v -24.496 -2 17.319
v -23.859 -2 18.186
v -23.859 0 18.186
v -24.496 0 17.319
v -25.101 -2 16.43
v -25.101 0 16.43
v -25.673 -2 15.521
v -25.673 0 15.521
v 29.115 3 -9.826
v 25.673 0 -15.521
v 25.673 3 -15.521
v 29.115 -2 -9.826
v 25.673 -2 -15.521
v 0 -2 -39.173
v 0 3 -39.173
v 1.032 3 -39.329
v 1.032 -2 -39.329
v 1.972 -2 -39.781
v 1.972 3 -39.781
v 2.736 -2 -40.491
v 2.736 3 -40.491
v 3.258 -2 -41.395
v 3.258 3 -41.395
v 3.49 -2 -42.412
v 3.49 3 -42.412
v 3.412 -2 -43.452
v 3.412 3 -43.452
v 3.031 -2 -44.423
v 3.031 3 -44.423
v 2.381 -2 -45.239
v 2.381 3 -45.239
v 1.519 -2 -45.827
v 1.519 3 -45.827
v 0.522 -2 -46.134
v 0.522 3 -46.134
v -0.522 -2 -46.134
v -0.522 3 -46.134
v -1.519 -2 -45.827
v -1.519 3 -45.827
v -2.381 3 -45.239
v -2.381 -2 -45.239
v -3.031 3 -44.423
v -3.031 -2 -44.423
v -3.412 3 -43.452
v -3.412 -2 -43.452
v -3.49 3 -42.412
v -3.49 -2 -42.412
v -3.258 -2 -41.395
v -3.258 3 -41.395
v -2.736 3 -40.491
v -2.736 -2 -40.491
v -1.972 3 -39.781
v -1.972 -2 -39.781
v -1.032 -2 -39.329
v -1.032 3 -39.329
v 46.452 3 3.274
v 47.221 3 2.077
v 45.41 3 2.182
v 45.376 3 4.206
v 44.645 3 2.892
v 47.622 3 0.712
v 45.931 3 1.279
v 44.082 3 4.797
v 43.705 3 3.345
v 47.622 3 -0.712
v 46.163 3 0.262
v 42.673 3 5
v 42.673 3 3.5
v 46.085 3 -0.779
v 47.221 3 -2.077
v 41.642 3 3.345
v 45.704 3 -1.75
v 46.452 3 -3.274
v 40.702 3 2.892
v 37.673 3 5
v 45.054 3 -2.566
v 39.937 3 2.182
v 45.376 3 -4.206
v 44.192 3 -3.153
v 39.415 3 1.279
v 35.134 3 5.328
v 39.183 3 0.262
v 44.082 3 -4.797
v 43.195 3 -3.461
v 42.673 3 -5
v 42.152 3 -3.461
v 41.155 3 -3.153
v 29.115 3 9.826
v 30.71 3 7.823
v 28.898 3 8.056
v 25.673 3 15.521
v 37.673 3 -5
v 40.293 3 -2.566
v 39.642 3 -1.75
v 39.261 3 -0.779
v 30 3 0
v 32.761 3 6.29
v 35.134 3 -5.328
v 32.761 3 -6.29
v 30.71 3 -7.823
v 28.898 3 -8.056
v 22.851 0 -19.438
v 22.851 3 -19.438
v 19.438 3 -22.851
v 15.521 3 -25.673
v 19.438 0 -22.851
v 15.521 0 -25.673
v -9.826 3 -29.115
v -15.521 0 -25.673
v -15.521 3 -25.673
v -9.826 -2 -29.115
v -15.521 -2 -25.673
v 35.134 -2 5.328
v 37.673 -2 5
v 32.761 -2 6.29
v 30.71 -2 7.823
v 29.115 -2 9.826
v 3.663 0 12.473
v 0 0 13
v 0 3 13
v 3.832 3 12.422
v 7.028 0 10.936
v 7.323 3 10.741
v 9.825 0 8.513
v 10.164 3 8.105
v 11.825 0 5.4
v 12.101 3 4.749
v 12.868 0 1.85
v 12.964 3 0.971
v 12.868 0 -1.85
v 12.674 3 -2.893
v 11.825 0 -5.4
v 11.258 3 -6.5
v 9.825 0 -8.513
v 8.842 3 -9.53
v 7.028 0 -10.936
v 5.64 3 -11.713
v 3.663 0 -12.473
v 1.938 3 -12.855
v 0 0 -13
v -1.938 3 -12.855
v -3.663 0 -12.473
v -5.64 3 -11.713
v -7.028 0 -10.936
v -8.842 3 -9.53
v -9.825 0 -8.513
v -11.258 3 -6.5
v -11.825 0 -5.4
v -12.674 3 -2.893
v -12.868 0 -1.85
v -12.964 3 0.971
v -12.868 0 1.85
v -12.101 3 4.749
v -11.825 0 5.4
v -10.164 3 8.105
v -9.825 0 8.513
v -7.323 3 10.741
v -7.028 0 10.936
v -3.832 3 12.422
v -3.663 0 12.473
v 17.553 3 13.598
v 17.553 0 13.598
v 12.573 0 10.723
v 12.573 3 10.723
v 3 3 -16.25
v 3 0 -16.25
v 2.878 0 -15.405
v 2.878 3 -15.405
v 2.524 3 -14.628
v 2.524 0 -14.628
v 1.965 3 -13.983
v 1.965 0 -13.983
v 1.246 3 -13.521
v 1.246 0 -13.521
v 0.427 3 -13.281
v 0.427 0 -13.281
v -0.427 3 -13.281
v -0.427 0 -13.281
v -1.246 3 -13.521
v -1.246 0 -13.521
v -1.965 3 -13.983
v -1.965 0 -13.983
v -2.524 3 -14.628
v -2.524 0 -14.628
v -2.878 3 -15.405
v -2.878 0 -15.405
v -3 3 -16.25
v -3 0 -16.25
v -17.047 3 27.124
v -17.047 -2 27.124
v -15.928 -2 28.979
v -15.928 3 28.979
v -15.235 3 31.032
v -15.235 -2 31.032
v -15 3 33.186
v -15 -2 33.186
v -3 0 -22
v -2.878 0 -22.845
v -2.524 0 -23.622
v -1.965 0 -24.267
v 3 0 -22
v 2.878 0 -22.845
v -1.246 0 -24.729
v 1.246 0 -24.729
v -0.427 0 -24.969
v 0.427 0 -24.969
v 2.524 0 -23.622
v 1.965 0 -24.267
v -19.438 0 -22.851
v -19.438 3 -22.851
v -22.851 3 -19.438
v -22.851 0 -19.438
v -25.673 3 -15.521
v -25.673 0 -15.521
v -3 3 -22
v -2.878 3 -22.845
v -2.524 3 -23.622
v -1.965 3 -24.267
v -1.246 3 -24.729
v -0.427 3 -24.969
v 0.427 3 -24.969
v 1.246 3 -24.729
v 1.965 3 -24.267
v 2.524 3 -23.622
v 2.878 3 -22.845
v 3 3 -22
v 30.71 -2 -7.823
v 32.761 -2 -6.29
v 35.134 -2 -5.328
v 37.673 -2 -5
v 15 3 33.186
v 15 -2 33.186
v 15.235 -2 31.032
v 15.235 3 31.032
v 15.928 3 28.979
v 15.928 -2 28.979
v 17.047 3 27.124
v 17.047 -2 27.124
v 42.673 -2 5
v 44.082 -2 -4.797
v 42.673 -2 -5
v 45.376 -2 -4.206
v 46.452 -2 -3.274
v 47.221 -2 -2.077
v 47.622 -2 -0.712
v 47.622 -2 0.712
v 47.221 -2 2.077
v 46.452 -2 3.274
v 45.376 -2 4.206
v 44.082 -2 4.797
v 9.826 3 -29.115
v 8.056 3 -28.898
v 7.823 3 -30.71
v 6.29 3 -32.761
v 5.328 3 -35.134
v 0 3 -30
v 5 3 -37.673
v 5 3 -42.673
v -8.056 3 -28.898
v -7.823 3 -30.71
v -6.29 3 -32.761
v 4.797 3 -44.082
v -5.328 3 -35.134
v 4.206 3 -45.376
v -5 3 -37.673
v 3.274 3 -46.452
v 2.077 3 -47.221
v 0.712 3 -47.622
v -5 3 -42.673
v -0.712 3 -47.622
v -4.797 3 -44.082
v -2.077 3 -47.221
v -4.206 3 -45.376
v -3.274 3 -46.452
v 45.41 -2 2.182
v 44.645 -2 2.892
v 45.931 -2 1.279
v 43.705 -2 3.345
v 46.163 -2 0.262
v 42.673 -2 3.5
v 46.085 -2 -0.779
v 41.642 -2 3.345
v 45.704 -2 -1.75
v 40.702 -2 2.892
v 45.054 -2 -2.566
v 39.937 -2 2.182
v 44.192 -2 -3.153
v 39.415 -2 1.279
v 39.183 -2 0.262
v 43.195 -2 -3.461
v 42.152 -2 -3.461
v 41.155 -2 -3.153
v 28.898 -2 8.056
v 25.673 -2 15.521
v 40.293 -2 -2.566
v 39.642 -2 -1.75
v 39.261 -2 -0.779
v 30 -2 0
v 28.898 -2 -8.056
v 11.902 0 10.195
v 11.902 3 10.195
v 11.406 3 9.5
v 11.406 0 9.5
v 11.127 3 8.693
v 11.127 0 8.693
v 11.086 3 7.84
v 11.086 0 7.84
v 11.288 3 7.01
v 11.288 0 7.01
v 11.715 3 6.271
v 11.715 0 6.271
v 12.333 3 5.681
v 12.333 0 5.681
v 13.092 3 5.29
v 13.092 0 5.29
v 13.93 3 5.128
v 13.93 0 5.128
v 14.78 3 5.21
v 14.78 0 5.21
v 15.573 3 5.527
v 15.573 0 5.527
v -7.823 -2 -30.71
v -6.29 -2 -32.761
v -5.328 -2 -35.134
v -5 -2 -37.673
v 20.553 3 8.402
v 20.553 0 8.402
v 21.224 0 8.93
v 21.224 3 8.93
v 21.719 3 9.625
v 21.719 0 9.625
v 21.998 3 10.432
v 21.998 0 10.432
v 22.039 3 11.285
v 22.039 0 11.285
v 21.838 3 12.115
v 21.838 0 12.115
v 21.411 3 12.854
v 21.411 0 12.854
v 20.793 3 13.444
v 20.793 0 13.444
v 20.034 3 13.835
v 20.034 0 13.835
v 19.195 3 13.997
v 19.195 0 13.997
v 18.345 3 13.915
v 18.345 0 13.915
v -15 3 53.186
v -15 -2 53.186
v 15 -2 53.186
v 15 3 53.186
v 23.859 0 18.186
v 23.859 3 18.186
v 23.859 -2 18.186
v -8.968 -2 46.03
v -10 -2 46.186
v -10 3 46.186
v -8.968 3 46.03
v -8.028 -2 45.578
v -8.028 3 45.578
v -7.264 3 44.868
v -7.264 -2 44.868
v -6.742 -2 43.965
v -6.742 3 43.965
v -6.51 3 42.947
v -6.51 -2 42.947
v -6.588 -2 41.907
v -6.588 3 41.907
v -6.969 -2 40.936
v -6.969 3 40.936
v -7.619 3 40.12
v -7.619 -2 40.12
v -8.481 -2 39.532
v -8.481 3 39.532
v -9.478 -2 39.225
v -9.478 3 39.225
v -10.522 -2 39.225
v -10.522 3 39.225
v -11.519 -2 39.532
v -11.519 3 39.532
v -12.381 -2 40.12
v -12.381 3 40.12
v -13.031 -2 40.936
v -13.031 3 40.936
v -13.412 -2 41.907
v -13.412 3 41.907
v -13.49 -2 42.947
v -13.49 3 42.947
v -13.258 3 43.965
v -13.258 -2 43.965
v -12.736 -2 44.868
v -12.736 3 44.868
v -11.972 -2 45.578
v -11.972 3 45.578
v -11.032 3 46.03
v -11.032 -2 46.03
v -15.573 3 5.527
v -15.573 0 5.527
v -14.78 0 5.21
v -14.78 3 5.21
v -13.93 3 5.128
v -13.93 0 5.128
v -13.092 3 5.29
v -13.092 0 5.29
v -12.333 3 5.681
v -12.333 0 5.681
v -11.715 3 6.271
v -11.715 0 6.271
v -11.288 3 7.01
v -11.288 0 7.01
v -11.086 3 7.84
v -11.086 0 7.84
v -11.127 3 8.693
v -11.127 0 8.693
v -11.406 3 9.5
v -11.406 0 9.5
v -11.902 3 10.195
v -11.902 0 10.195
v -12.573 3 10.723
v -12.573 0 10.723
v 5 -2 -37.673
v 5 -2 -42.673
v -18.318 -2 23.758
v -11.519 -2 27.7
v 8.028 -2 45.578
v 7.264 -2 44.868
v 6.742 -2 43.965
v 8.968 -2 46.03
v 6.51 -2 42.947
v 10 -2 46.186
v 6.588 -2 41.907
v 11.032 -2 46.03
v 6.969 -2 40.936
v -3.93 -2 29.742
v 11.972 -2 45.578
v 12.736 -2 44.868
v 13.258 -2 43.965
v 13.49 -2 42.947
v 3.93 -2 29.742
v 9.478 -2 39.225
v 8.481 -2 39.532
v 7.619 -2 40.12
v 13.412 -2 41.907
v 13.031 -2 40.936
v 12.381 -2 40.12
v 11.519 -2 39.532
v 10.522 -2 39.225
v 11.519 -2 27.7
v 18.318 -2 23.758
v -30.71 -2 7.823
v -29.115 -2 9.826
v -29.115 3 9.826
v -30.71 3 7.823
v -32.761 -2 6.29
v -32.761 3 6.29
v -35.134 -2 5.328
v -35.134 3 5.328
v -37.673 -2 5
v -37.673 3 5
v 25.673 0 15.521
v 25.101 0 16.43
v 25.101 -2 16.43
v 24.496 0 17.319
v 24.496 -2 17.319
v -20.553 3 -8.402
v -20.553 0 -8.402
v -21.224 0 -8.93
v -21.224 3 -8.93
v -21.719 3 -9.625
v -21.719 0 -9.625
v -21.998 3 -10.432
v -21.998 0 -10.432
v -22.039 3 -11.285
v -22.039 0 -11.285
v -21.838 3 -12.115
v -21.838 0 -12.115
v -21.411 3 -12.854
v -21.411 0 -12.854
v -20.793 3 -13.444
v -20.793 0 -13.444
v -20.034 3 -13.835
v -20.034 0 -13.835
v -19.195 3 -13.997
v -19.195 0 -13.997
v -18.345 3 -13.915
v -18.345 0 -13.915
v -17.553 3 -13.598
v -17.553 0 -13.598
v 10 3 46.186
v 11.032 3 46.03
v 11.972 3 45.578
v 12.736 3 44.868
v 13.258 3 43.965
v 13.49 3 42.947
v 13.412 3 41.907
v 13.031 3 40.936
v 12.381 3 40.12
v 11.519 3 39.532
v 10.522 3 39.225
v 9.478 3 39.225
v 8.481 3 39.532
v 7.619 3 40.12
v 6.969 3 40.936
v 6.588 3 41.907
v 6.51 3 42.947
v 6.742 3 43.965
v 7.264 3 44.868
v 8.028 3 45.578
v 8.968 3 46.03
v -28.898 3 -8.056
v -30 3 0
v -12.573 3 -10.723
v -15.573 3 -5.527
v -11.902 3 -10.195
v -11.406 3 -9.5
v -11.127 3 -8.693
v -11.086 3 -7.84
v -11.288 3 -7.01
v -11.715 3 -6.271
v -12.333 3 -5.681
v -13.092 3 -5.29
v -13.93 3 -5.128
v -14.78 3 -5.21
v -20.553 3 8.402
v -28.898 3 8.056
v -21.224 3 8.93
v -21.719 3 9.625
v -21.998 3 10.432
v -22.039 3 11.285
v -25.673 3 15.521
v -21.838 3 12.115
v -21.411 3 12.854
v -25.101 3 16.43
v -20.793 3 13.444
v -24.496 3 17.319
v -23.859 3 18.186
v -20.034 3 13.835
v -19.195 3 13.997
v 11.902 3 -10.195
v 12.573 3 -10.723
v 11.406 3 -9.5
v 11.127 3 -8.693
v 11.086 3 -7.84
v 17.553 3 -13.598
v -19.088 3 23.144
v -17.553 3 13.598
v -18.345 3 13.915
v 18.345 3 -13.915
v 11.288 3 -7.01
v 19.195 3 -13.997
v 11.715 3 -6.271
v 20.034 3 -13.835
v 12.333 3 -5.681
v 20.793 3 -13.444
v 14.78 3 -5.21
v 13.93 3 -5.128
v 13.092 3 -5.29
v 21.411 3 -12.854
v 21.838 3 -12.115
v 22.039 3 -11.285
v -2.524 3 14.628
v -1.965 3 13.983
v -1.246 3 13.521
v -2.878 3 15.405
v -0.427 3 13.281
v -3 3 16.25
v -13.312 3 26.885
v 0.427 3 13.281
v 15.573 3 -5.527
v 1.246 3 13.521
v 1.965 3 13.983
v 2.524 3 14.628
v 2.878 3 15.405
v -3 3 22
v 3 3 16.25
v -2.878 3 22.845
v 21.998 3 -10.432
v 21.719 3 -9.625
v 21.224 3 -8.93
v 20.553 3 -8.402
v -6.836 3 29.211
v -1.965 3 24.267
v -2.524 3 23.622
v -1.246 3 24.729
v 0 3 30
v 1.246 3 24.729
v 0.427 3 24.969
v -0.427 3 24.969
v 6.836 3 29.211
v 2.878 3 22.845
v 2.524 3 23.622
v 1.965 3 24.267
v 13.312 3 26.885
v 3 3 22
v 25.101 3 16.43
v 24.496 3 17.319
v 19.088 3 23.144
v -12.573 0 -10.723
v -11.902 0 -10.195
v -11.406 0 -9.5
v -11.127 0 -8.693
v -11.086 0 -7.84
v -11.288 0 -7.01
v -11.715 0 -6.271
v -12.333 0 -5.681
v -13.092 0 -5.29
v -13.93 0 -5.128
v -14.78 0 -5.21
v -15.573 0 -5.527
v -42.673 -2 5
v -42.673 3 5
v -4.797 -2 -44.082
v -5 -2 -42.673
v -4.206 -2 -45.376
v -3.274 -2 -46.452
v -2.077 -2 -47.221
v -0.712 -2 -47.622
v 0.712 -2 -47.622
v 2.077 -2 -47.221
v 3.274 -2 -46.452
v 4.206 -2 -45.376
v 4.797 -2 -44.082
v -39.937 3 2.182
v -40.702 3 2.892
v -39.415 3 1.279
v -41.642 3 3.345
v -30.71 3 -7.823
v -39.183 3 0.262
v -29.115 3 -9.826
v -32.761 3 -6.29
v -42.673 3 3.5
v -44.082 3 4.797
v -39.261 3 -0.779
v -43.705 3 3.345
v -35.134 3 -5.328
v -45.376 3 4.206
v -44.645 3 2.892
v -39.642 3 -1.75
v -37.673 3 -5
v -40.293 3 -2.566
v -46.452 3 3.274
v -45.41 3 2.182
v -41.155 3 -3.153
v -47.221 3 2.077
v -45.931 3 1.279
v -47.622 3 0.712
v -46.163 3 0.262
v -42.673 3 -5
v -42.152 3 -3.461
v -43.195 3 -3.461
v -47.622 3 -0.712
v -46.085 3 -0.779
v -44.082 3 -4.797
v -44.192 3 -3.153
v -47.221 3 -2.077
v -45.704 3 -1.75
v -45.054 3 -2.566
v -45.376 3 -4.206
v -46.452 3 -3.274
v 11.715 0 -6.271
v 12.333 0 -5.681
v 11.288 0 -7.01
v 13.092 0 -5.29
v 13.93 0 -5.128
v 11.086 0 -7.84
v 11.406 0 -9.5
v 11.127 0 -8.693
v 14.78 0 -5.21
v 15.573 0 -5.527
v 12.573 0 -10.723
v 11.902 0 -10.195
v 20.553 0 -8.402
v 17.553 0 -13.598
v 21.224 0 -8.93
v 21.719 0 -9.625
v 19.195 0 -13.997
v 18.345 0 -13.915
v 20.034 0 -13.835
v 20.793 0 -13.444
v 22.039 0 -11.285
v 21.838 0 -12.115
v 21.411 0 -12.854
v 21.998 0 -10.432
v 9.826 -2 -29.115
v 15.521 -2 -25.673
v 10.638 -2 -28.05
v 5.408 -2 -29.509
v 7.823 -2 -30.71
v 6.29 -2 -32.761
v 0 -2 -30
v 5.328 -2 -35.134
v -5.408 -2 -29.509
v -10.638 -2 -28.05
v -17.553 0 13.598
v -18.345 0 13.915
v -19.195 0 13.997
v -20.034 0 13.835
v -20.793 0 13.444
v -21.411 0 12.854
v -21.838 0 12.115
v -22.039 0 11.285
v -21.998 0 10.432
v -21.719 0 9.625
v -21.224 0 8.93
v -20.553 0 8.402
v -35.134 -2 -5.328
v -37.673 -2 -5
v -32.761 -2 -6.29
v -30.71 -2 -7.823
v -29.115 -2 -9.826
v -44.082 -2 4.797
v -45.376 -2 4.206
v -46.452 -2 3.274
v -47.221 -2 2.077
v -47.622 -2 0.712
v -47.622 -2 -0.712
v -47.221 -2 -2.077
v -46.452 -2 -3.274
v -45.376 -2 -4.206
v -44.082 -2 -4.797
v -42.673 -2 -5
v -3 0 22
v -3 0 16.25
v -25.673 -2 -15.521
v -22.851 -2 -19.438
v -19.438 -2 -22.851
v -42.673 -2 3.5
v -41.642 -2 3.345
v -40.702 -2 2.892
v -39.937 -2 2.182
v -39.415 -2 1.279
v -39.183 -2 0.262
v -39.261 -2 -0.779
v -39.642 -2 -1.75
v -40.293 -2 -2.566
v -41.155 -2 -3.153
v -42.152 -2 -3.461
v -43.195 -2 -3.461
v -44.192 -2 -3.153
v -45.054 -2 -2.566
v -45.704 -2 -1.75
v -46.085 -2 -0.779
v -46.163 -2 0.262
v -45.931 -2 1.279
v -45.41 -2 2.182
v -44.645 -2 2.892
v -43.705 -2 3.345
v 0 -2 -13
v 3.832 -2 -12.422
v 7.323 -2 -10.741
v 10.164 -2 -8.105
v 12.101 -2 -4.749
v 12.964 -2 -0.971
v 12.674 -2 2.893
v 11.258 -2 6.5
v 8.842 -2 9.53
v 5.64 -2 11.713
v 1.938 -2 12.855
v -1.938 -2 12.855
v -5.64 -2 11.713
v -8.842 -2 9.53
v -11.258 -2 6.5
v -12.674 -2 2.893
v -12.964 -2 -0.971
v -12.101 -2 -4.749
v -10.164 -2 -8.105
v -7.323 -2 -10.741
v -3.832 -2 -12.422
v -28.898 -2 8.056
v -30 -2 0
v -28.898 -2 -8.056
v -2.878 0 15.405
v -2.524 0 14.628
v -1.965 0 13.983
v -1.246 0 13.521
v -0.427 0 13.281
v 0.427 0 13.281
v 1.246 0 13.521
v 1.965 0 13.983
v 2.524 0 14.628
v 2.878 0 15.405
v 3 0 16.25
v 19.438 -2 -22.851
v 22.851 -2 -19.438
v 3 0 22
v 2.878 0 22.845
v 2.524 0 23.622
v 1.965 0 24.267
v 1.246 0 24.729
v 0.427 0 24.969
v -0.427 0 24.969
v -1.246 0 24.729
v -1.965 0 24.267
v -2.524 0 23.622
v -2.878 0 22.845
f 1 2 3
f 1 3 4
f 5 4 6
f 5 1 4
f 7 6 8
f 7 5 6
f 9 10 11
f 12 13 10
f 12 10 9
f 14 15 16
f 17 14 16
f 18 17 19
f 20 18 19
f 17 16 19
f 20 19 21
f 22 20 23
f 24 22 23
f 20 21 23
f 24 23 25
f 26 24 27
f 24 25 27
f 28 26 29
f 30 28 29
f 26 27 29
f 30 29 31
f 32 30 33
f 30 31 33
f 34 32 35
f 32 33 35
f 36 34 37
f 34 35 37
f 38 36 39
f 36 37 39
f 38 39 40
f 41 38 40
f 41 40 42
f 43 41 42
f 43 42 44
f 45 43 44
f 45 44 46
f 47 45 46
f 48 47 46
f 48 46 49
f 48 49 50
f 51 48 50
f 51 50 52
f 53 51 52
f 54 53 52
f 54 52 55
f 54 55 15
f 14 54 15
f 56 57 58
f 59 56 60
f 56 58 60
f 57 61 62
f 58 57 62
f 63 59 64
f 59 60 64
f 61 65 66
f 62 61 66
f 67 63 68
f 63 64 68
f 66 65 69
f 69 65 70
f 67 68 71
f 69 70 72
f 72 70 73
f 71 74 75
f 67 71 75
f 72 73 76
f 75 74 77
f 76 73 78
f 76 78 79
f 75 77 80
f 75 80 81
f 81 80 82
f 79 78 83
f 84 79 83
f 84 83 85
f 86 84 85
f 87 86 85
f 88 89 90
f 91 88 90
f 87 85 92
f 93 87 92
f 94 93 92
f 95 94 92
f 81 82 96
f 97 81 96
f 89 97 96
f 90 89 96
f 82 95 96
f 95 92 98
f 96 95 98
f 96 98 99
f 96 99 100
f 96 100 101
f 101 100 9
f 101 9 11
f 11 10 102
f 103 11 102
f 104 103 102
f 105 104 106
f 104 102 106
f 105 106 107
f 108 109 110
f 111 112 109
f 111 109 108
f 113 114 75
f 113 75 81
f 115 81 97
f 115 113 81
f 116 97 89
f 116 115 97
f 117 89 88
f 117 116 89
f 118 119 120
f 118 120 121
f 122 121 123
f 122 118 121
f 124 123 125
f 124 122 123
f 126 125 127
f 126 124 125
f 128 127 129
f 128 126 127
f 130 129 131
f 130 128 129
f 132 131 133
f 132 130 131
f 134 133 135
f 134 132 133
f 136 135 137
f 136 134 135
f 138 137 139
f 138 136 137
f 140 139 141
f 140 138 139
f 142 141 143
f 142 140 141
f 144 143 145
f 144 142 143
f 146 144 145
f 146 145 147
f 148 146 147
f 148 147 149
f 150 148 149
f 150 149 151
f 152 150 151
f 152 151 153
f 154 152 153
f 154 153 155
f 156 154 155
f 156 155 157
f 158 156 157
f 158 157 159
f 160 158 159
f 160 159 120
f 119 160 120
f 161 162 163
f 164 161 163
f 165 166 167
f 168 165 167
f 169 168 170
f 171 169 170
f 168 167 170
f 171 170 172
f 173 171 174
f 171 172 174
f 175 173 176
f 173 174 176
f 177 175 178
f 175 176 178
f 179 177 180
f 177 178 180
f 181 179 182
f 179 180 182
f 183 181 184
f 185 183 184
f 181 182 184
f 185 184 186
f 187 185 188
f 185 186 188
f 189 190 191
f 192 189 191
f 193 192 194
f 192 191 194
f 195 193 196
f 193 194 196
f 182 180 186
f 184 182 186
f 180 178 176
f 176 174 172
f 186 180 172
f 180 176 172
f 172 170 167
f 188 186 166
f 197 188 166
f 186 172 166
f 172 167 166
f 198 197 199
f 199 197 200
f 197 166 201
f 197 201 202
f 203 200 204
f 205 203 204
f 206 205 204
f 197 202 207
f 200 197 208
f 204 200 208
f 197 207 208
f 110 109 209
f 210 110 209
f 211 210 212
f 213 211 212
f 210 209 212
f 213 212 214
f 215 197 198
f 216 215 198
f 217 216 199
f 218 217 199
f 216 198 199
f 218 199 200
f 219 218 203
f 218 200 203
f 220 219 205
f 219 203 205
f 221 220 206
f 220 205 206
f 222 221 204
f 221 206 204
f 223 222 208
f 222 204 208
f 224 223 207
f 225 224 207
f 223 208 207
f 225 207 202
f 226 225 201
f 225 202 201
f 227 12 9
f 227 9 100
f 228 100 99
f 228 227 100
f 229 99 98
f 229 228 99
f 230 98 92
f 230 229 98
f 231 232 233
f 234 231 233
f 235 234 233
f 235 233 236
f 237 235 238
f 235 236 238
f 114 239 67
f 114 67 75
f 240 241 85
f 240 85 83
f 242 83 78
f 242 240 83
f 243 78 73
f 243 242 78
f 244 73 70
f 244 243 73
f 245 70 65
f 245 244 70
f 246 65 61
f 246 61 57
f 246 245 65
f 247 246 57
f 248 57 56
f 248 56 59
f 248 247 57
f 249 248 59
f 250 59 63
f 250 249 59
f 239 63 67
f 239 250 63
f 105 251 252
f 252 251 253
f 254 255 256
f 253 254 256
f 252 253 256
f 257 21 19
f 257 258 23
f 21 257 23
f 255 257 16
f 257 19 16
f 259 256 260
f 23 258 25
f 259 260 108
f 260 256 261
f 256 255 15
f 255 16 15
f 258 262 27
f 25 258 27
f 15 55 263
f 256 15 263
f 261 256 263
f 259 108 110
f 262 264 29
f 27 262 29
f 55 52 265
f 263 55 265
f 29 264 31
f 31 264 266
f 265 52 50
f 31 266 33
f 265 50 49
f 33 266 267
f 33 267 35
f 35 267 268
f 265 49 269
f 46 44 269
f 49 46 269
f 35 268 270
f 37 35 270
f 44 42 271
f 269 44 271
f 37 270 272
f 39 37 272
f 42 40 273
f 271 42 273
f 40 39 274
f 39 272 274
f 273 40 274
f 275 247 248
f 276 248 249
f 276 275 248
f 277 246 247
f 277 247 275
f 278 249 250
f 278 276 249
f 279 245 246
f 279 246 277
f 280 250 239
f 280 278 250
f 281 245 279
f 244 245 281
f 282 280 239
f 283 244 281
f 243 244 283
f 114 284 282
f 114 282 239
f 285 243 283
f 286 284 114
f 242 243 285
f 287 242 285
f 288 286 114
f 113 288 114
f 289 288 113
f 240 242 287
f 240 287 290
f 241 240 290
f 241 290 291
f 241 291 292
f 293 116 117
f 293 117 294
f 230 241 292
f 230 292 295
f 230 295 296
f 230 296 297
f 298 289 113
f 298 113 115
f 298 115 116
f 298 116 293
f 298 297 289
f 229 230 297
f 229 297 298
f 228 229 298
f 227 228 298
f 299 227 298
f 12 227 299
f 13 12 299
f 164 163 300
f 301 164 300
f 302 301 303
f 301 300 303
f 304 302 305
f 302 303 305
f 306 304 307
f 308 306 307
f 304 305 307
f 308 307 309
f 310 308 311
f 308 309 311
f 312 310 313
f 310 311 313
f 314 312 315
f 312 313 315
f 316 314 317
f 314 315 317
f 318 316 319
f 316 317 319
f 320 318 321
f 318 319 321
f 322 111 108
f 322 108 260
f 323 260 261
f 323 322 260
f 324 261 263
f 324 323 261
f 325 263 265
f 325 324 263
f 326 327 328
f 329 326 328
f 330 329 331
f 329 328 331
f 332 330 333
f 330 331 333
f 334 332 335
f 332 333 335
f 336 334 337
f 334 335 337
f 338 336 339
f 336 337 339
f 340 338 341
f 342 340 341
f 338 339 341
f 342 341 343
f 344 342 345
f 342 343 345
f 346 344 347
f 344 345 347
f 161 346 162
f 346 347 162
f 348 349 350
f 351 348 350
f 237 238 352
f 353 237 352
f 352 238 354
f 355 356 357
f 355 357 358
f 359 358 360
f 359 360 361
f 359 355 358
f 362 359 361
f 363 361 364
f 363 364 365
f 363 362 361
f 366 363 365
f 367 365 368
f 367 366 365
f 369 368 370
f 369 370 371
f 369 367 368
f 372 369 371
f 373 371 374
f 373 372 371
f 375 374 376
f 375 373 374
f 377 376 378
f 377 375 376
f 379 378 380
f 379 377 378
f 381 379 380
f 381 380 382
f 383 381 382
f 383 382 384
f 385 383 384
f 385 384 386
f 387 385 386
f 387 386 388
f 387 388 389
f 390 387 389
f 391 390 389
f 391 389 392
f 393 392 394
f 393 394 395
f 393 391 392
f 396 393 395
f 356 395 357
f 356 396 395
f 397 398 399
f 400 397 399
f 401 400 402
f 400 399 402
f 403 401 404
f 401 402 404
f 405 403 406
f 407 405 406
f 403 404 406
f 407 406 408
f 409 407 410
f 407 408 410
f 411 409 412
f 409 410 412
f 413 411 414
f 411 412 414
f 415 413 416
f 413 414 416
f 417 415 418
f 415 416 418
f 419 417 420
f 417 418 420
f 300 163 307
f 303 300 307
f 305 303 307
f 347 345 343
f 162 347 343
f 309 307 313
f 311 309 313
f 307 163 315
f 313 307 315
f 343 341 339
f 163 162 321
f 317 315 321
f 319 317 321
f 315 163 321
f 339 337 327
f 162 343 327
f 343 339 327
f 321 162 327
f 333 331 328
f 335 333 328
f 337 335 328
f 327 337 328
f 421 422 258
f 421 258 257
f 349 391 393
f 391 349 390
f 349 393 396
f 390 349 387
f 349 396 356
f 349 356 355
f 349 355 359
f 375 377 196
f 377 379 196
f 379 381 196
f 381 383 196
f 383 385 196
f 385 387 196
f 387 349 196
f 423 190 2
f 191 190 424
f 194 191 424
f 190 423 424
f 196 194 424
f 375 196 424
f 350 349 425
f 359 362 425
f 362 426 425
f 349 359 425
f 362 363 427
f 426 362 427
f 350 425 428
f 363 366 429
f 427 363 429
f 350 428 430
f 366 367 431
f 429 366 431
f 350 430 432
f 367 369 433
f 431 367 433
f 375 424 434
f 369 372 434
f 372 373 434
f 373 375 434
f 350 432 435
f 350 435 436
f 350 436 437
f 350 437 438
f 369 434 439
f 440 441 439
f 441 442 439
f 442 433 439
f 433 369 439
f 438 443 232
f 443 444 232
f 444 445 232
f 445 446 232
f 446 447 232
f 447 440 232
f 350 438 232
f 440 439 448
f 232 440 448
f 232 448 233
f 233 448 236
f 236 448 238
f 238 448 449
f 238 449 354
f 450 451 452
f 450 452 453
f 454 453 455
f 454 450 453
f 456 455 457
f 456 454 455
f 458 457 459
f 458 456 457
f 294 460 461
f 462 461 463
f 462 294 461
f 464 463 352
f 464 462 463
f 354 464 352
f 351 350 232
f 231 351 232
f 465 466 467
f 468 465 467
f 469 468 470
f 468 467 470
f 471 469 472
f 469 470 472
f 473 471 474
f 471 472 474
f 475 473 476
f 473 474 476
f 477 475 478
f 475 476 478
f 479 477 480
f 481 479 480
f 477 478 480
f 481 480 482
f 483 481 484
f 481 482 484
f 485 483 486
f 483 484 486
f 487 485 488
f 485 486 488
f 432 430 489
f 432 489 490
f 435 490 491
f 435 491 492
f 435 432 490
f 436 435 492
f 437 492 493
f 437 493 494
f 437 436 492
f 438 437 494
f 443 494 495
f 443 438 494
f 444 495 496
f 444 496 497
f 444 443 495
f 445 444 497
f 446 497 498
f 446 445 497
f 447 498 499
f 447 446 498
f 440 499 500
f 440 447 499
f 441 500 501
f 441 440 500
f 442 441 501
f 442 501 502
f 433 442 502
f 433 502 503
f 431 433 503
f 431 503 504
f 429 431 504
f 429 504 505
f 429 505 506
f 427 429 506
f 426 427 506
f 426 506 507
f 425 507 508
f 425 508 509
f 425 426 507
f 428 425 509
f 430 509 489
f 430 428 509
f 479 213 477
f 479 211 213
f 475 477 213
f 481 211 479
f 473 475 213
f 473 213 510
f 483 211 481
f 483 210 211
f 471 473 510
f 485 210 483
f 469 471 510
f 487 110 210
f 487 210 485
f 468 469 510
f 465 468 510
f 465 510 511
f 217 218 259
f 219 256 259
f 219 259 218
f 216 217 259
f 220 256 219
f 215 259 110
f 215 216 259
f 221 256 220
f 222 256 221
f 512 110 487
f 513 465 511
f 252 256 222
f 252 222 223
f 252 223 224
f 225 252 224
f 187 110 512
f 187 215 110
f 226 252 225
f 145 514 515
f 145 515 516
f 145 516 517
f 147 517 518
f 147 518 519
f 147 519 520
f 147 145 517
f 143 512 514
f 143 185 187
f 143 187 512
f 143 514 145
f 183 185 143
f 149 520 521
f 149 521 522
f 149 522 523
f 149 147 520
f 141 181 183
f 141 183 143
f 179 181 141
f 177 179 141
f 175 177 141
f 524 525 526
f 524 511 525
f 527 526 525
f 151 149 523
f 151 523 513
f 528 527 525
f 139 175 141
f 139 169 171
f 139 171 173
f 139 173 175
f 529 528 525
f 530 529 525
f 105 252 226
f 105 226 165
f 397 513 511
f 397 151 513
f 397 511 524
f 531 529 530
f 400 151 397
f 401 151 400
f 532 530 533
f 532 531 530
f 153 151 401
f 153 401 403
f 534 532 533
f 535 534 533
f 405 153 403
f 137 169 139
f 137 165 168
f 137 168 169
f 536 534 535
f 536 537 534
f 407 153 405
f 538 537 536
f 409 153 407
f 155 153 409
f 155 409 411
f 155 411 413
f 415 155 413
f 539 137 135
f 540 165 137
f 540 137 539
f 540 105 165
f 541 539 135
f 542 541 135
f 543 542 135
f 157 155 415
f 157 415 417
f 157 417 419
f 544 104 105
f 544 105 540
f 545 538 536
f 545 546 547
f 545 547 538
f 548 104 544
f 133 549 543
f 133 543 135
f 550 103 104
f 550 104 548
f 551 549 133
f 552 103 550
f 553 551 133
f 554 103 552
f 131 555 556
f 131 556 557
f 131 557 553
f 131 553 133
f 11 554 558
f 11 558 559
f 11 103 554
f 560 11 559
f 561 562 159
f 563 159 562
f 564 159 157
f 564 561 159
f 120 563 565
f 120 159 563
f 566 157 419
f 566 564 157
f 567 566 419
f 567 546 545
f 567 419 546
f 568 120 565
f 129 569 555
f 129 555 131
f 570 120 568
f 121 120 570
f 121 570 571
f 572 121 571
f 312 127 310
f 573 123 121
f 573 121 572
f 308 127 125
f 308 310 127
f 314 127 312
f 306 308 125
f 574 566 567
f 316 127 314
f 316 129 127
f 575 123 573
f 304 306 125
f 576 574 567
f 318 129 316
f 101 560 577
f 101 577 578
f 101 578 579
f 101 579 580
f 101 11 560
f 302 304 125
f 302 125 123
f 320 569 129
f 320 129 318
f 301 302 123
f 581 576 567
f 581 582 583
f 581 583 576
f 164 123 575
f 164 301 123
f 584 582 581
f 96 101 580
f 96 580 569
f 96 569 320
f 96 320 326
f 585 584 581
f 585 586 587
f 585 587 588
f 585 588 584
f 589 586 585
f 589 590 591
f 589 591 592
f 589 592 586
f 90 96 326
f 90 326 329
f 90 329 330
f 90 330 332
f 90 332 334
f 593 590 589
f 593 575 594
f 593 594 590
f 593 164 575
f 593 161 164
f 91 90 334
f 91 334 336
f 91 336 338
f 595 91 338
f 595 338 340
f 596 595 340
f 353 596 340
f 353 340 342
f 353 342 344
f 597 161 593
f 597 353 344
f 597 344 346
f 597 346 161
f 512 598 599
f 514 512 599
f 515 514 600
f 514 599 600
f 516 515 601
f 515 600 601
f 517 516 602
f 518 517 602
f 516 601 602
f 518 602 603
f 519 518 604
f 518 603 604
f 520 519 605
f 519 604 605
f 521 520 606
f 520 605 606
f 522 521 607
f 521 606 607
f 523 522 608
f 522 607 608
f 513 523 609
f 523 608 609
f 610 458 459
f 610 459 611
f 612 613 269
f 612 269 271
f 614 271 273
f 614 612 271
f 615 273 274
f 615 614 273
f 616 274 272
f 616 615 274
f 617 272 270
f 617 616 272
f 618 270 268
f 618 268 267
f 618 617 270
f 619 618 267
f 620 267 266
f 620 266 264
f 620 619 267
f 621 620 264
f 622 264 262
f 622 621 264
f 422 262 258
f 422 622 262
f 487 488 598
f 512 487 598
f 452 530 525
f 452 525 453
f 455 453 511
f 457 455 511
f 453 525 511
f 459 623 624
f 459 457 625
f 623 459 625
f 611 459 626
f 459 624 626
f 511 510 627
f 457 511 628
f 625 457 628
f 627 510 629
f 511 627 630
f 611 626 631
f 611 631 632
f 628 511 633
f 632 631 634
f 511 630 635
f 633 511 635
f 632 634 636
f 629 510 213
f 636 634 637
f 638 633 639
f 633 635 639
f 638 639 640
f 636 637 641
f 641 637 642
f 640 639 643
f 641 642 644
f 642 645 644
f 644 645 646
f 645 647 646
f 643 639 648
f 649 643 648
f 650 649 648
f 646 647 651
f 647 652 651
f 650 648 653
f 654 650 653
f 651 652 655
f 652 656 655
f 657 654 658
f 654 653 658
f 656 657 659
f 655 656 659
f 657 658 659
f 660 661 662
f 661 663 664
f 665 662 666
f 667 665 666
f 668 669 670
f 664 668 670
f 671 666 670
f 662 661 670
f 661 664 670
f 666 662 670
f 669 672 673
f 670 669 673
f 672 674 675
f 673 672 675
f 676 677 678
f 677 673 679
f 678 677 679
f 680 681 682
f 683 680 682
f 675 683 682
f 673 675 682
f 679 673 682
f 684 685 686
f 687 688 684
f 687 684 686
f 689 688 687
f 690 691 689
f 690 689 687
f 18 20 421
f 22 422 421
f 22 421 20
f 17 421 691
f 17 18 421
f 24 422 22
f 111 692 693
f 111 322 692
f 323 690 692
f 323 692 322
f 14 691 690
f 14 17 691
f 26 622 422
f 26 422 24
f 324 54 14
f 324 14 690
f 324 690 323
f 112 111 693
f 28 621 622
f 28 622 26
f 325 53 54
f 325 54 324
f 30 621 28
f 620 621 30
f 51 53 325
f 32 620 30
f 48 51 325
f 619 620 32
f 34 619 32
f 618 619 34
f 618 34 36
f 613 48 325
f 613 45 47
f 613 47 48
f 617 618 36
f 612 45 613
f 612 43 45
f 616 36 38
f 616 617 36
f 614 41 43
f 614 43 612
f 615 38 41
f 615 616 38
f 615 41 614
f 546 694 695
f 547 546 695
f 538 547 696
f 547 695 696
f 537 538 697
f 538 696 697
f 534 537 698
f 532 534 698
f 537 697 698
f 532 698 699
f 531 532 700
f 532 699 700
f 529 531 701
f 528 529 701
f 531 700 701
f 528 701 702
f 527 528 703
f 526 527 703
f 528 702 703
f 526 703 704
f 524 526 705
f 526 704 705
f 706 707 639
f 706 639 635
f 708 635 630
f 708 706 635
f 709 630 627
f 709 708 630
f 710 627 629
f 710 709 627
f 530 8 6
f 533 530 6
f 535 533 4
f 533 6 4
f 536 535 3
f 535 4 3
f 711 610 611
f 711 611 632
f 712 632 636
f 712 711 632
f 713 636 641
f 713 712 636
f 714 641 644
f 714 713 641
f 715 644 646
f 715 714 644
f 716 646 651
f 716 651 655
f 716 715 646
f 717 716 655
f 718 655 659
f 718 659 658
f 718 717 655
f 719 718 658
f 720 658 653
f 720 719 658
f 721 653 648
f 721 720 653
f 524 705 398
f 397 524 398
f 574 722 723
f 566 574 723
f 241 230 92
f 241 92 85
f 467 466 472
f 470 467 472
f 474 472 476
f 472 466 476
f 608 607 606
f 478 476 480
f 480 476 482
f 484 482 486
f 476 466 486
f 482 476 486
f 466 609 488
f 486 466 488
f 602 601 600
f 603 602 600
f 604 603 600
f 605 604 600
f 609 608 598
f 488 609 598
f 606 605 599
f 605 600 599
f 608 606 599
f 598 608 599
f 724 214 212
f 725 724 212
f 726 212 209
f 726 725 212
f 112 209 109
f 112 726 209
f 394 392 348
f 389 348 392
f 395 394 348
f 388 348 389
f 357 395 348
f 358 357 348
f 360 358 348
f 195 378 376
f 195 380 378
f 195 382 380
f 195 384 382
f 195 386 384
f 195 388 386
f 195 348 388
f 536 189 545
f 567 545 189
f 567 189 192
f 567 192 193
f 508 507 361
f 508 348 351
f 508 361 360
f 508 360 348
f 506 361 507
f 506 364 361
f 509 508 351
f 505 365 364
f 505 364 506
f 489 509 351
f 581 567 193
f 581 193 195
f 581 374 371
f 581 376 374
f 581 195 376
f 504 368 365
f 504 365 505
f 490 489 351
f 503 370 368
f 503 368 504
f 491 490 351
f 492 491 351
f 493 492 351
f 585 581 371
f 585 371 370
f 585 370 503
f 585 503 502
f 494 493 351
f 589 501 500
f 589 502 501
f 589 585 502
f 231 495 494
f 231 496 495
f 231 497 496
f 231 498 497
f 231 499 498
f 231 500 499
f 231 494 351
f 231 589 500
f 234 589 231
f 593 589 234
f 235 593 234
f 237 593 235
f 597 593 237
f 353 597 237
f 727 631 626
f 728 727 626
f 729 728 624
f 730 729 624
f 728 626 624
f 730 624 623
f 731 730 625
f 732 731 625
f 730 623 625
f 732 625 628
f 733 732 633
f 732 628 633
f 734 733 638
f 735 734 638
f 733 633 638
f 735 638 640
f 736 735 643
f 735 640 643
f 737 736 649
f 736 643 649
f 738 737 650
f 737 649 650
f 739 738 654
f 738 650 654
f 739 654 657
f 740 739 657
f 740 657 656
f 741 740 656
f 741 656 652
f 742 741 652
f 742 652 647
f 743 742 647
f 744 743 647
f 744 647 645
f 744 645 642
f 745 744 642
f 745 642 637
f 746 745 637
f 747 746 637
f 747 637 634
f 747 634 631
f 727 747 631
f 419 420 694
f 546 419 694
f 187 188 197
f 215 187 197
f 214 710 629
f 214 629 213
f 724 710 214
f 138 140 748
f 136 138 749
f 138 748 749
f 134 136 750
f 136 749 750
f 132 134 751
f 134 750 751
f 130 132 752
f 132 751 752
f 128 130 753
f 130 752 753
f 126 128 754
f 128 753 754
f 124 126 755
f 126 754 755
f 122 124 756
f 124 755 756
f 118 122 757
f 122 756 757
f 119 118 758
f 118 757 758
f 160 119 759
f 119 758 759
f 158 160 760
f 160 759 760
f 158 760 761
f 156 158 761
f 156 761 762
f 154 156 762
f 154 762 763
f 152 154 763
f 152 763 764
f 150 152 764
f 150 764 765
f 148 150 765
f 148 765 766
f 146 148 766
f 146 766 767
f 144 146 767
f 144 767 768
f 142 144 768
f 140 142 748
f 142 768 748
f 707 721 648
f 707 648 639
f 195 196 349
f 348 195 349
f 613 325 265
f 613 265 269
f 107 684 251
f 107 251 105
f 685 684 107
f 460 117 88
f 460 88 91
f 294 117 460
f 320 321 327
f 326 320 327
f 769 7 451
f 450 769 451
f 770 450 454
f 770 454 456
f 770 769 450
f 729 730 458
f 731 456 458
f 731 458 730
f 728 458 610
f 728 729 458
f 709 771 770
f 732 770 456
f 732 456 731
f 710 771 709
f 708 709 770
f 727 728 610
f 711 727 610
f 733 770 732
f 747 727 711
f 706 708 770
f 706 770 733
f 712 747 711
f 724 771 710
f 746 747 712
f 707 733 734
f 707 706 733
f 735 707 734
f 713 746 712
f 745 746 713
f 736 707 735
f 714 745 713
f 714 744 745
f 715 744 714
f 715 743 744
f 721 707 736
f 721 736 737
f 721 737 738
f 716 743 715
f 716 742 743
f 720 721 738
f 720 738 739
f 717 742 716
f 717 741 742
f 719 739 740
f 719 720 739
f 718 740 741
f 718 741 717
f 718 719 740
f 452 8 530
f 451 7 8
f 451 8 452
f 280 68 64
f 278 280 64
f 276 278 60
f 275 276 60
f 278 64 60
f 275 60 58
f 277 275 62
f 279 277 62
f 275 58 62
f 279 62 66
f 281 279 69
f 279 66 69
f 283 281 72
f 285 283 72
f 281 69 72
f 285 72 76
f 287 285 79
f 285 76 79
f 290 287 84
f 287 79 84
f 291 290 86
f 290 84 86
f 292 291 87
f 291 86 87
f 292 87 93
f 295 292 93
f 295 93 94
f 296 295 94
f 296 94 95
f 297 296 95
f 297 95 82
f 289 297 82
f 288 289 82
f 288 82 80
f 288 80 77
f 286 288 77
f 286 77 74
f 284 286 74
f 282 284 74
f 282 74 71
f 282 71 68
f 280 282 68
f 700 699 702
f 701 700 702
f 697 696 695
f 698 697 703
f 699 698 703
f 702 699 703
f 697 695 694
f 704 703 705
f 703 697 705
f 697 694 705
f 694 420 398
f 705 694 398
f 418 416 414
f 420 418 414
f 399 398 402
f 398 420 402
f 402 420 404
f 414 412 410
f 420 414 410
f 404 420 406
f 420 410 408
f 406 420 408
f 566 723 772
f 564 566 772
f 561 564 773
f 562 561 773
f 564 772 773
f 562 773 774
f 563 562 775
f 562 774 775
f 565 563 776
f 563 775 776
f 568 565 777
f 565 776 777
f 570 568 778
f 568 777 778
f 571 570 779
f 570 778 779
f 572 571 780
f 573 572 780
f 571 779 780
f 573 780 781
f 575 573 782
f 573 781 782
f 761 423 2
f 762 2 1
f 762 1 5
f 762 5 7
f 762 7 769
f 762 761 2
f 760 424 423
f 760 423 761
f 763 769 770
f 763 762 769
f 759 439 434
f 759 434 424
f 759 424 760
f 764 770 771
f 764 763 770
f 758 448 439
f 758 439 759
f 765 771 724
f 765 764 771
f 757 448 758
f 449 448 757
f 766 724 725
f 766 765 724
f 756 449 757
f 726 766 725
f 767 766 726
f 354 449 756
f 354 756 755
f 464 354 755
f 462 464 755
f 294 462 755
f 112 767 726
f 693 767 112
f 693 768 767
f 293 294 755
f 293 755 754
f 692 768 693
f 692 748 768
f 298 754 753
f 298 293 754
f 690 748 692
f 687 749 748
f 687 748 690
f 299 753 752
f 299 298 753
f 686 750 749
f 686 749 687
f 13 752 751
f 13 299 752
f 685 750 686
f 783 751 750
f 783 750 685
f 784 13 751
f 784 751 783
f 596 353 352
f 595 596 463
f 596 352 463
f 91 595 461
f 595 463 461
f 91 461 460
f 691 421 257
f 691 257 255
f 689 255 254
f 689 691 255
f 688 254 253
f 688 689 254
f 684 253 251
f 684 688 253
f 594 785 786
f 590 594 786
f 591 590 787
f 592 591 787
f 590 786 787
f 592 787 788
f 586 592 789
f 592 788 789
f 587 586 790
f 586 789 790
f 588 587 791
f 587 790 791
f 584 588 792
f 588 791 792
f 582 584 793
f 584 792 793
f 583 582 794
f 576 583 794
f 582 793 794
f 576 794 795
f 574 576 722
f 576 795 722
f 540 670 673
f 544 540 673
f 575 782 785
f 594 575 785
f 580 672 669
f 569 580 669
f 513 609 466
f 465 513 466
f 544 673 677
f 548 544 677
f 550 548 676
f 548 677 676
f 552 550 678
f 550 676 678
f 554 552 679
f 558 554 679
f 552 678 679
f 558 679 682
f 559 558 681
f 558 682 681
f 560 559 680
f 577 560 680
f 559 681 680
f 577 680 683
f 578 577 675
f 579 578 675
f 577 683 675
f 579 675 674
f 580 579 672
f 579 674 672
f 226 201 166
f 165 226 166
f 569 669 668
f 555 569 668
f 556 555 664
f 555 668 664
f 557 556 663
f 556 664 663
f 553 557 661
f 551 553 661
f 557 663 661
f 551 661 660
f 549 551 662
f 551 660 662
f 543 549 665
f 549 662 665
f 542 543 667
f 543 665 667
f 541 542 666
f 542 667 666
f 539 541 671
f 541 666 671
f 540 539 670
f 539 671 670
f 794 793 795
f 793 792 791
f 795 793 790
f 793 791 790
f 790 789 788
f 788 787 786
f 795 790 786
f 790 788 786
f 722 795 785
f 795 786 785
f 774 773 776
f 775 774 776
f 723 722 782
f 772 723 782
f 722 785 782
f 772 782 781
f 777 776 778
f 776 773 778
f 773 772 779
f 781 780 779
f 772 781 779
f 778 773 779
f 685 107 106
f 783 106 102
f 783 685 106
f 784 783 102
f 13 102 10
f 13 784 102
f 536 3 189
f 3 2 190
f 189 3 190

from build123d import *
from build123d.topology import SkipClean

# Parameters (mm, degrees)
ESQUISSE1_R             = 30
ESQUISSE1_R_2           = 13
BOSS_EXTRU_1_DEPTH      = 3
BOSS_EXTRU_2_START      = 2
ESQUISSE2_R             = 30
ESQUISSE2_R_2           = 13
BOSS_EXTRU_2_DEPTH      = 2
BOSS_EXTRU_3_START      = -5
ESQUISSE3_R             = 3.5
BOSS_EXTRU_3_DEPTH      = 5
ESQUISSE4_R             = 3.5
ENL_V_MAT_EXTRU_1_DEPTH = 72.599371852


with BuildPart() as part:
    # Esquisse1 → Boss.-Extru.1 (new body)
    with BuildSketch(Plane(origin=(0, 0, 0), x_dir=(1, 0, 0), z_dir=(0, 1, 0))):
        with Locations(Location((0, 0, 0), (0, 0, 270))):
            Circle(ESQUISSE1_R)
        with Locations(Location((0, 0, 0), (0, 0, 270))):
            Circle(ESQUISSE1_R_2, mode=Mode.SUBTRACT)
        with BuildLine():
            Line((-3, 16.25), (-3, 22))
            ThreePointArc((-3, 22), (0, 25), (3, 22))
            Line((3, 22), (3, 16.25))
            ThreePointArc((3, 16.25), (0, 13.25), (-3, 16.25))
        make_face(mode=Mode.SUBTRACT)
        with BuildLine():
            Line((12.572912811, 10.723076211), (17.552558883, 13.598076211))
            ThreePointArc((17.552558883, 13.598076211), (21.650635095, 12.5), (20.552558883, 8.401923789))
            Line((20.552558883, 8.401923789), (15.572912811, 5.526923789))
            ThreePointArc((15.572912811, 5.526923789), (11.4748366, 6.625), (12.572912811, 10.723076211))
        make_face(mode=Mode.SUBTRACT)
        with BuildLine():
            Line((15.572912811, -5.526923789), (20.552558883, -8.401923789))
            ThreePointArc((20.552558883, -8.401923789), (21.650635095, -12.5), (17.552558883, -13.598076211))
            Line((17.552558883, -13.598076211), (12.572912811, -10.723076211))
            ThreePointArc((12.572912811, -10.723076211), (11.4748366, -6.625), (15.572912811, -5.526923789))
        make_face(mode=Mode.SUBTRACT)
        with BuildLine():
            Line((3, -16.25), (3, -22))
            ThreePointArc((3, -22), (0, -25), (-3, -22))
            Line((-3, -22), (-3, -16.25))
            ThreePointArc((-3, -16.25), (0, -13.25), (3, -16.25))
        make_face(mode=Mode.SUBTRACT)
        with BuildLine():
            Line((-12.572912811, -10.723076211), (-17.552558883, -13.598076211))
            ThreePointArc((-17.552558883, -13.598076211), (-21.650635095, -12.5), (-20.552558883, -8.401923789))
            Line((-20.552558883, -8.401923789), (-15.572912811, -5.526923789))
            ThreePointArc((-15.572912811, -5.526923789), (-11.4748366, -6.625), (-12.572912811, -10.723076211))
        make_face(mode=Mode.SUBTRACT)
        with BuildLine():
            Line((-15.572912811, 5.526923789), (-20.552558883, 8.401923789))
            ThreePointArc((-20.552558883, 8.401923789), (-21.650635095, 12.5), (-17.552558883, 13.598076211))
            Line((-17.552558883, 13.598076211), (-12.572912811, 10.723076211))
            ThreePointArc((-12.572912811, 10.723076211), (-11.4748366, 6.625), (-15.572912811, 5.526923789))
        make_face(mode=Mode.SUBTRACT)
    extrude(amount=BOSS_EXTRU_1_DEPTH)

    # Esquisse2 → Boss.-Extru.2 (add)
    with BuildSketch(Plane.XZ.offset(BOSS_EXTRU_2_START)):
        with Locations(Location((0, 0, 0), (0, 0, 270))):
            Circle(ESQUISSE2_R)
        with Locations(Location((0, 0, 0), (0, 0, 270))):
            Circle(ESQUISSE2_R_2, mode=Mode.SUBTRACT)
    extrude(amount=-BOSS_EXTRU_2_DEPTH)

    # Esquisse3 → Boss.-Extru.3 (add)
    # profile 1 of 4: a face of its own
    with SkipClean():  # the faces are left unmerged after this step: merging them gives an invalid solid
        with BuildSketch(Plane(origin=(0, 3, 0), x_dir=(1, 0, 0), z_dir=(0, 1, 0)).offset(BOSS_EXTRU_3_START)):
            with BuildLine():
                Line((-15, -33.185852199), (-15, -53.185852199))
                Line((-15, -53.185852199), (15, -53.185852199))
                Line((15, -53.185852199), (15, -33.185852199))
                ThreePointArc((15, -33.185852199), (15.525518495, -29.986758544), (17.046840042, -27.123901466))
                Line((17.046840042, -27.123901466), (23.859479873, -18.185852199))
                ThreePointArc((23.859479873, -18.185852199), (0, -30), (-23.859479873, -18.185852199))
                Line((-23.859479873, -18.185852199), (-17.046840042, -27.123901466))
                ThreePointArc((-17.046840042, -27.123901466), (-15.525518495, -29.986758544), (-15, -33.185852199))
            make_face()
            with Locations(Location((-10, -42.685852199, 0), (0, 0, 270))):
                Circle(ESQUISSE3_R, mode=Mode.SUBTRACT)
            with Locations(Location((10, -42.685852199, 0), (0, 0, 270))):
                Circle(ESQUISSE3_R, mode=Mode.SUBTRACT)
        # profile 2 of 4: a face of its own
        with BuildSketch(Plane(origin=(0, 3, 0), x_dir=(1, 0, 0), z_dir=(0, 1, 0)).offset(BOSS_EXTRU_3_START)):
            with BuildLine():
                Line((37.673212347, 5), (42.673212347, 5))
                ThreePointArc((42.673212347, 5), (47.673212347, 0), (42.673212347, -5))
                Line((42.673212347, -5), (37.673212347, -5))
                ThreePointArc((37.673212347, -5), (32.760729603, -6.289804061), (29.115474898, -9.826497342))
                Line((29.115474898, -9.826497342), (25.673212347, -15.520507974))
                ThreePointArc((25.673212347, -15.520507974), (30, 0), (25.673212347, 15.520507974))
                Line((25.673212347, 15.520507974), (29.115474898, 9.826497342))
                ThreePointArc((29.115474898, 9.826497342), (32.760729603, 6.289804061), (37.673212347, 5))
            make_face()
        # profile 3 of 4: a face of its own
        with BuildSketch(Plane(origin=(0, 3, 0), x_dir=(1, 0, 0), z_dir=(0, 1, 0)).offset(BOSS_EXTRU_3_START)):
            with BuildLine():
                Line((-5, 37.673212347), (-5, 42.673212347))
                ThreePointArc((-5, 42.673212347), (0, 47.673212347), (5, 42.673212347))
                Line((5, 42.673212347), (5, 37.673212347))
                ThreePointArc((5, 37.673212347), (6.289804061, 32.760729603), (9.826497342, 29.115474898))
                Line((9.826497342, 29.115474898), (15.520507974, 25.673212347))
                ThreePointArc((15.520507974, 25.673212347), (0, 30), (-15.520507974, 25.673212347))
                Line((-15.520507974, 25.673212347), (-9.826497342, 29.115474898))
                ThreePointArc((-9.826497342, 29.115474898), (-6.289804061, 32.760729603), (-5, 37.673212347))
            make_face()
        # profile 4 of 4: a face of its own
        with BuildSketch(Plane(origin=(0, 3, 0), x_dir=(1, 0, 0), z_dir=(0, 1, 0)).offset(BOSS_EXTRU_3_START)):
            with BuildLine():
                Line((-37.673212347, -5), (-42.673212347, -5))
                ThreePointArc((-42.673212347, -5), (-47.673212347, 0), (-42.673212347, 5))
                Line((-42.673212347, 5), (-37.673212347, 5))
                ThreePointArc((-37.673212347, 5), (-32.760729603, 6.289804061), (-29.115474898, 9.826497342))
                Line((-29.115474898, 9.826497342), (-25.673212347, 15.520507974))
                ThreePointArc((-25.673212347, 15.520507974), (-30, 0), (-25.673212347, -15.520507974))
                Line((-25.673212347, -15.520507974), (-29.115474898, -9.826497342))
                ThreePointArc((-29.115474898, -9.826497342), (-32.760729603, -6.289804061), (-37.673212347, -5))
            make_face()
        extrude(amount=BOSS_EXTRU_3_DEPTH)

    # Esquisse4 → Enlèv. mat.-Extru.1 (cut, through all)
    with SkipClean():  # the faces are left unmerged after this step: merging them gives an invalid solid
        with BuildSketch(Plane(origin=(0, 3, 0), x_dir=(1, 0, 0), z_dir=(0, 1, 0))):
            with Locations(Location((-42.673212347, 0, 0), (0, 0, 270))):
                Circle(ESQUISSE4_R)
            with Locations(Location((42.673212347, 0, 0), (0, 0, 270))):
                Circle(ESQUISSE4_R)
            with Locations(Location((0, 42.673212347, 0), (0, 0, 270))):
                Circle(ESQUISSE4_R)
        extrude(amount=-ENL_V_MAT_EXTRU_1_DEPTH, mode=Mode.SUBTRACT)


solid = part.part
